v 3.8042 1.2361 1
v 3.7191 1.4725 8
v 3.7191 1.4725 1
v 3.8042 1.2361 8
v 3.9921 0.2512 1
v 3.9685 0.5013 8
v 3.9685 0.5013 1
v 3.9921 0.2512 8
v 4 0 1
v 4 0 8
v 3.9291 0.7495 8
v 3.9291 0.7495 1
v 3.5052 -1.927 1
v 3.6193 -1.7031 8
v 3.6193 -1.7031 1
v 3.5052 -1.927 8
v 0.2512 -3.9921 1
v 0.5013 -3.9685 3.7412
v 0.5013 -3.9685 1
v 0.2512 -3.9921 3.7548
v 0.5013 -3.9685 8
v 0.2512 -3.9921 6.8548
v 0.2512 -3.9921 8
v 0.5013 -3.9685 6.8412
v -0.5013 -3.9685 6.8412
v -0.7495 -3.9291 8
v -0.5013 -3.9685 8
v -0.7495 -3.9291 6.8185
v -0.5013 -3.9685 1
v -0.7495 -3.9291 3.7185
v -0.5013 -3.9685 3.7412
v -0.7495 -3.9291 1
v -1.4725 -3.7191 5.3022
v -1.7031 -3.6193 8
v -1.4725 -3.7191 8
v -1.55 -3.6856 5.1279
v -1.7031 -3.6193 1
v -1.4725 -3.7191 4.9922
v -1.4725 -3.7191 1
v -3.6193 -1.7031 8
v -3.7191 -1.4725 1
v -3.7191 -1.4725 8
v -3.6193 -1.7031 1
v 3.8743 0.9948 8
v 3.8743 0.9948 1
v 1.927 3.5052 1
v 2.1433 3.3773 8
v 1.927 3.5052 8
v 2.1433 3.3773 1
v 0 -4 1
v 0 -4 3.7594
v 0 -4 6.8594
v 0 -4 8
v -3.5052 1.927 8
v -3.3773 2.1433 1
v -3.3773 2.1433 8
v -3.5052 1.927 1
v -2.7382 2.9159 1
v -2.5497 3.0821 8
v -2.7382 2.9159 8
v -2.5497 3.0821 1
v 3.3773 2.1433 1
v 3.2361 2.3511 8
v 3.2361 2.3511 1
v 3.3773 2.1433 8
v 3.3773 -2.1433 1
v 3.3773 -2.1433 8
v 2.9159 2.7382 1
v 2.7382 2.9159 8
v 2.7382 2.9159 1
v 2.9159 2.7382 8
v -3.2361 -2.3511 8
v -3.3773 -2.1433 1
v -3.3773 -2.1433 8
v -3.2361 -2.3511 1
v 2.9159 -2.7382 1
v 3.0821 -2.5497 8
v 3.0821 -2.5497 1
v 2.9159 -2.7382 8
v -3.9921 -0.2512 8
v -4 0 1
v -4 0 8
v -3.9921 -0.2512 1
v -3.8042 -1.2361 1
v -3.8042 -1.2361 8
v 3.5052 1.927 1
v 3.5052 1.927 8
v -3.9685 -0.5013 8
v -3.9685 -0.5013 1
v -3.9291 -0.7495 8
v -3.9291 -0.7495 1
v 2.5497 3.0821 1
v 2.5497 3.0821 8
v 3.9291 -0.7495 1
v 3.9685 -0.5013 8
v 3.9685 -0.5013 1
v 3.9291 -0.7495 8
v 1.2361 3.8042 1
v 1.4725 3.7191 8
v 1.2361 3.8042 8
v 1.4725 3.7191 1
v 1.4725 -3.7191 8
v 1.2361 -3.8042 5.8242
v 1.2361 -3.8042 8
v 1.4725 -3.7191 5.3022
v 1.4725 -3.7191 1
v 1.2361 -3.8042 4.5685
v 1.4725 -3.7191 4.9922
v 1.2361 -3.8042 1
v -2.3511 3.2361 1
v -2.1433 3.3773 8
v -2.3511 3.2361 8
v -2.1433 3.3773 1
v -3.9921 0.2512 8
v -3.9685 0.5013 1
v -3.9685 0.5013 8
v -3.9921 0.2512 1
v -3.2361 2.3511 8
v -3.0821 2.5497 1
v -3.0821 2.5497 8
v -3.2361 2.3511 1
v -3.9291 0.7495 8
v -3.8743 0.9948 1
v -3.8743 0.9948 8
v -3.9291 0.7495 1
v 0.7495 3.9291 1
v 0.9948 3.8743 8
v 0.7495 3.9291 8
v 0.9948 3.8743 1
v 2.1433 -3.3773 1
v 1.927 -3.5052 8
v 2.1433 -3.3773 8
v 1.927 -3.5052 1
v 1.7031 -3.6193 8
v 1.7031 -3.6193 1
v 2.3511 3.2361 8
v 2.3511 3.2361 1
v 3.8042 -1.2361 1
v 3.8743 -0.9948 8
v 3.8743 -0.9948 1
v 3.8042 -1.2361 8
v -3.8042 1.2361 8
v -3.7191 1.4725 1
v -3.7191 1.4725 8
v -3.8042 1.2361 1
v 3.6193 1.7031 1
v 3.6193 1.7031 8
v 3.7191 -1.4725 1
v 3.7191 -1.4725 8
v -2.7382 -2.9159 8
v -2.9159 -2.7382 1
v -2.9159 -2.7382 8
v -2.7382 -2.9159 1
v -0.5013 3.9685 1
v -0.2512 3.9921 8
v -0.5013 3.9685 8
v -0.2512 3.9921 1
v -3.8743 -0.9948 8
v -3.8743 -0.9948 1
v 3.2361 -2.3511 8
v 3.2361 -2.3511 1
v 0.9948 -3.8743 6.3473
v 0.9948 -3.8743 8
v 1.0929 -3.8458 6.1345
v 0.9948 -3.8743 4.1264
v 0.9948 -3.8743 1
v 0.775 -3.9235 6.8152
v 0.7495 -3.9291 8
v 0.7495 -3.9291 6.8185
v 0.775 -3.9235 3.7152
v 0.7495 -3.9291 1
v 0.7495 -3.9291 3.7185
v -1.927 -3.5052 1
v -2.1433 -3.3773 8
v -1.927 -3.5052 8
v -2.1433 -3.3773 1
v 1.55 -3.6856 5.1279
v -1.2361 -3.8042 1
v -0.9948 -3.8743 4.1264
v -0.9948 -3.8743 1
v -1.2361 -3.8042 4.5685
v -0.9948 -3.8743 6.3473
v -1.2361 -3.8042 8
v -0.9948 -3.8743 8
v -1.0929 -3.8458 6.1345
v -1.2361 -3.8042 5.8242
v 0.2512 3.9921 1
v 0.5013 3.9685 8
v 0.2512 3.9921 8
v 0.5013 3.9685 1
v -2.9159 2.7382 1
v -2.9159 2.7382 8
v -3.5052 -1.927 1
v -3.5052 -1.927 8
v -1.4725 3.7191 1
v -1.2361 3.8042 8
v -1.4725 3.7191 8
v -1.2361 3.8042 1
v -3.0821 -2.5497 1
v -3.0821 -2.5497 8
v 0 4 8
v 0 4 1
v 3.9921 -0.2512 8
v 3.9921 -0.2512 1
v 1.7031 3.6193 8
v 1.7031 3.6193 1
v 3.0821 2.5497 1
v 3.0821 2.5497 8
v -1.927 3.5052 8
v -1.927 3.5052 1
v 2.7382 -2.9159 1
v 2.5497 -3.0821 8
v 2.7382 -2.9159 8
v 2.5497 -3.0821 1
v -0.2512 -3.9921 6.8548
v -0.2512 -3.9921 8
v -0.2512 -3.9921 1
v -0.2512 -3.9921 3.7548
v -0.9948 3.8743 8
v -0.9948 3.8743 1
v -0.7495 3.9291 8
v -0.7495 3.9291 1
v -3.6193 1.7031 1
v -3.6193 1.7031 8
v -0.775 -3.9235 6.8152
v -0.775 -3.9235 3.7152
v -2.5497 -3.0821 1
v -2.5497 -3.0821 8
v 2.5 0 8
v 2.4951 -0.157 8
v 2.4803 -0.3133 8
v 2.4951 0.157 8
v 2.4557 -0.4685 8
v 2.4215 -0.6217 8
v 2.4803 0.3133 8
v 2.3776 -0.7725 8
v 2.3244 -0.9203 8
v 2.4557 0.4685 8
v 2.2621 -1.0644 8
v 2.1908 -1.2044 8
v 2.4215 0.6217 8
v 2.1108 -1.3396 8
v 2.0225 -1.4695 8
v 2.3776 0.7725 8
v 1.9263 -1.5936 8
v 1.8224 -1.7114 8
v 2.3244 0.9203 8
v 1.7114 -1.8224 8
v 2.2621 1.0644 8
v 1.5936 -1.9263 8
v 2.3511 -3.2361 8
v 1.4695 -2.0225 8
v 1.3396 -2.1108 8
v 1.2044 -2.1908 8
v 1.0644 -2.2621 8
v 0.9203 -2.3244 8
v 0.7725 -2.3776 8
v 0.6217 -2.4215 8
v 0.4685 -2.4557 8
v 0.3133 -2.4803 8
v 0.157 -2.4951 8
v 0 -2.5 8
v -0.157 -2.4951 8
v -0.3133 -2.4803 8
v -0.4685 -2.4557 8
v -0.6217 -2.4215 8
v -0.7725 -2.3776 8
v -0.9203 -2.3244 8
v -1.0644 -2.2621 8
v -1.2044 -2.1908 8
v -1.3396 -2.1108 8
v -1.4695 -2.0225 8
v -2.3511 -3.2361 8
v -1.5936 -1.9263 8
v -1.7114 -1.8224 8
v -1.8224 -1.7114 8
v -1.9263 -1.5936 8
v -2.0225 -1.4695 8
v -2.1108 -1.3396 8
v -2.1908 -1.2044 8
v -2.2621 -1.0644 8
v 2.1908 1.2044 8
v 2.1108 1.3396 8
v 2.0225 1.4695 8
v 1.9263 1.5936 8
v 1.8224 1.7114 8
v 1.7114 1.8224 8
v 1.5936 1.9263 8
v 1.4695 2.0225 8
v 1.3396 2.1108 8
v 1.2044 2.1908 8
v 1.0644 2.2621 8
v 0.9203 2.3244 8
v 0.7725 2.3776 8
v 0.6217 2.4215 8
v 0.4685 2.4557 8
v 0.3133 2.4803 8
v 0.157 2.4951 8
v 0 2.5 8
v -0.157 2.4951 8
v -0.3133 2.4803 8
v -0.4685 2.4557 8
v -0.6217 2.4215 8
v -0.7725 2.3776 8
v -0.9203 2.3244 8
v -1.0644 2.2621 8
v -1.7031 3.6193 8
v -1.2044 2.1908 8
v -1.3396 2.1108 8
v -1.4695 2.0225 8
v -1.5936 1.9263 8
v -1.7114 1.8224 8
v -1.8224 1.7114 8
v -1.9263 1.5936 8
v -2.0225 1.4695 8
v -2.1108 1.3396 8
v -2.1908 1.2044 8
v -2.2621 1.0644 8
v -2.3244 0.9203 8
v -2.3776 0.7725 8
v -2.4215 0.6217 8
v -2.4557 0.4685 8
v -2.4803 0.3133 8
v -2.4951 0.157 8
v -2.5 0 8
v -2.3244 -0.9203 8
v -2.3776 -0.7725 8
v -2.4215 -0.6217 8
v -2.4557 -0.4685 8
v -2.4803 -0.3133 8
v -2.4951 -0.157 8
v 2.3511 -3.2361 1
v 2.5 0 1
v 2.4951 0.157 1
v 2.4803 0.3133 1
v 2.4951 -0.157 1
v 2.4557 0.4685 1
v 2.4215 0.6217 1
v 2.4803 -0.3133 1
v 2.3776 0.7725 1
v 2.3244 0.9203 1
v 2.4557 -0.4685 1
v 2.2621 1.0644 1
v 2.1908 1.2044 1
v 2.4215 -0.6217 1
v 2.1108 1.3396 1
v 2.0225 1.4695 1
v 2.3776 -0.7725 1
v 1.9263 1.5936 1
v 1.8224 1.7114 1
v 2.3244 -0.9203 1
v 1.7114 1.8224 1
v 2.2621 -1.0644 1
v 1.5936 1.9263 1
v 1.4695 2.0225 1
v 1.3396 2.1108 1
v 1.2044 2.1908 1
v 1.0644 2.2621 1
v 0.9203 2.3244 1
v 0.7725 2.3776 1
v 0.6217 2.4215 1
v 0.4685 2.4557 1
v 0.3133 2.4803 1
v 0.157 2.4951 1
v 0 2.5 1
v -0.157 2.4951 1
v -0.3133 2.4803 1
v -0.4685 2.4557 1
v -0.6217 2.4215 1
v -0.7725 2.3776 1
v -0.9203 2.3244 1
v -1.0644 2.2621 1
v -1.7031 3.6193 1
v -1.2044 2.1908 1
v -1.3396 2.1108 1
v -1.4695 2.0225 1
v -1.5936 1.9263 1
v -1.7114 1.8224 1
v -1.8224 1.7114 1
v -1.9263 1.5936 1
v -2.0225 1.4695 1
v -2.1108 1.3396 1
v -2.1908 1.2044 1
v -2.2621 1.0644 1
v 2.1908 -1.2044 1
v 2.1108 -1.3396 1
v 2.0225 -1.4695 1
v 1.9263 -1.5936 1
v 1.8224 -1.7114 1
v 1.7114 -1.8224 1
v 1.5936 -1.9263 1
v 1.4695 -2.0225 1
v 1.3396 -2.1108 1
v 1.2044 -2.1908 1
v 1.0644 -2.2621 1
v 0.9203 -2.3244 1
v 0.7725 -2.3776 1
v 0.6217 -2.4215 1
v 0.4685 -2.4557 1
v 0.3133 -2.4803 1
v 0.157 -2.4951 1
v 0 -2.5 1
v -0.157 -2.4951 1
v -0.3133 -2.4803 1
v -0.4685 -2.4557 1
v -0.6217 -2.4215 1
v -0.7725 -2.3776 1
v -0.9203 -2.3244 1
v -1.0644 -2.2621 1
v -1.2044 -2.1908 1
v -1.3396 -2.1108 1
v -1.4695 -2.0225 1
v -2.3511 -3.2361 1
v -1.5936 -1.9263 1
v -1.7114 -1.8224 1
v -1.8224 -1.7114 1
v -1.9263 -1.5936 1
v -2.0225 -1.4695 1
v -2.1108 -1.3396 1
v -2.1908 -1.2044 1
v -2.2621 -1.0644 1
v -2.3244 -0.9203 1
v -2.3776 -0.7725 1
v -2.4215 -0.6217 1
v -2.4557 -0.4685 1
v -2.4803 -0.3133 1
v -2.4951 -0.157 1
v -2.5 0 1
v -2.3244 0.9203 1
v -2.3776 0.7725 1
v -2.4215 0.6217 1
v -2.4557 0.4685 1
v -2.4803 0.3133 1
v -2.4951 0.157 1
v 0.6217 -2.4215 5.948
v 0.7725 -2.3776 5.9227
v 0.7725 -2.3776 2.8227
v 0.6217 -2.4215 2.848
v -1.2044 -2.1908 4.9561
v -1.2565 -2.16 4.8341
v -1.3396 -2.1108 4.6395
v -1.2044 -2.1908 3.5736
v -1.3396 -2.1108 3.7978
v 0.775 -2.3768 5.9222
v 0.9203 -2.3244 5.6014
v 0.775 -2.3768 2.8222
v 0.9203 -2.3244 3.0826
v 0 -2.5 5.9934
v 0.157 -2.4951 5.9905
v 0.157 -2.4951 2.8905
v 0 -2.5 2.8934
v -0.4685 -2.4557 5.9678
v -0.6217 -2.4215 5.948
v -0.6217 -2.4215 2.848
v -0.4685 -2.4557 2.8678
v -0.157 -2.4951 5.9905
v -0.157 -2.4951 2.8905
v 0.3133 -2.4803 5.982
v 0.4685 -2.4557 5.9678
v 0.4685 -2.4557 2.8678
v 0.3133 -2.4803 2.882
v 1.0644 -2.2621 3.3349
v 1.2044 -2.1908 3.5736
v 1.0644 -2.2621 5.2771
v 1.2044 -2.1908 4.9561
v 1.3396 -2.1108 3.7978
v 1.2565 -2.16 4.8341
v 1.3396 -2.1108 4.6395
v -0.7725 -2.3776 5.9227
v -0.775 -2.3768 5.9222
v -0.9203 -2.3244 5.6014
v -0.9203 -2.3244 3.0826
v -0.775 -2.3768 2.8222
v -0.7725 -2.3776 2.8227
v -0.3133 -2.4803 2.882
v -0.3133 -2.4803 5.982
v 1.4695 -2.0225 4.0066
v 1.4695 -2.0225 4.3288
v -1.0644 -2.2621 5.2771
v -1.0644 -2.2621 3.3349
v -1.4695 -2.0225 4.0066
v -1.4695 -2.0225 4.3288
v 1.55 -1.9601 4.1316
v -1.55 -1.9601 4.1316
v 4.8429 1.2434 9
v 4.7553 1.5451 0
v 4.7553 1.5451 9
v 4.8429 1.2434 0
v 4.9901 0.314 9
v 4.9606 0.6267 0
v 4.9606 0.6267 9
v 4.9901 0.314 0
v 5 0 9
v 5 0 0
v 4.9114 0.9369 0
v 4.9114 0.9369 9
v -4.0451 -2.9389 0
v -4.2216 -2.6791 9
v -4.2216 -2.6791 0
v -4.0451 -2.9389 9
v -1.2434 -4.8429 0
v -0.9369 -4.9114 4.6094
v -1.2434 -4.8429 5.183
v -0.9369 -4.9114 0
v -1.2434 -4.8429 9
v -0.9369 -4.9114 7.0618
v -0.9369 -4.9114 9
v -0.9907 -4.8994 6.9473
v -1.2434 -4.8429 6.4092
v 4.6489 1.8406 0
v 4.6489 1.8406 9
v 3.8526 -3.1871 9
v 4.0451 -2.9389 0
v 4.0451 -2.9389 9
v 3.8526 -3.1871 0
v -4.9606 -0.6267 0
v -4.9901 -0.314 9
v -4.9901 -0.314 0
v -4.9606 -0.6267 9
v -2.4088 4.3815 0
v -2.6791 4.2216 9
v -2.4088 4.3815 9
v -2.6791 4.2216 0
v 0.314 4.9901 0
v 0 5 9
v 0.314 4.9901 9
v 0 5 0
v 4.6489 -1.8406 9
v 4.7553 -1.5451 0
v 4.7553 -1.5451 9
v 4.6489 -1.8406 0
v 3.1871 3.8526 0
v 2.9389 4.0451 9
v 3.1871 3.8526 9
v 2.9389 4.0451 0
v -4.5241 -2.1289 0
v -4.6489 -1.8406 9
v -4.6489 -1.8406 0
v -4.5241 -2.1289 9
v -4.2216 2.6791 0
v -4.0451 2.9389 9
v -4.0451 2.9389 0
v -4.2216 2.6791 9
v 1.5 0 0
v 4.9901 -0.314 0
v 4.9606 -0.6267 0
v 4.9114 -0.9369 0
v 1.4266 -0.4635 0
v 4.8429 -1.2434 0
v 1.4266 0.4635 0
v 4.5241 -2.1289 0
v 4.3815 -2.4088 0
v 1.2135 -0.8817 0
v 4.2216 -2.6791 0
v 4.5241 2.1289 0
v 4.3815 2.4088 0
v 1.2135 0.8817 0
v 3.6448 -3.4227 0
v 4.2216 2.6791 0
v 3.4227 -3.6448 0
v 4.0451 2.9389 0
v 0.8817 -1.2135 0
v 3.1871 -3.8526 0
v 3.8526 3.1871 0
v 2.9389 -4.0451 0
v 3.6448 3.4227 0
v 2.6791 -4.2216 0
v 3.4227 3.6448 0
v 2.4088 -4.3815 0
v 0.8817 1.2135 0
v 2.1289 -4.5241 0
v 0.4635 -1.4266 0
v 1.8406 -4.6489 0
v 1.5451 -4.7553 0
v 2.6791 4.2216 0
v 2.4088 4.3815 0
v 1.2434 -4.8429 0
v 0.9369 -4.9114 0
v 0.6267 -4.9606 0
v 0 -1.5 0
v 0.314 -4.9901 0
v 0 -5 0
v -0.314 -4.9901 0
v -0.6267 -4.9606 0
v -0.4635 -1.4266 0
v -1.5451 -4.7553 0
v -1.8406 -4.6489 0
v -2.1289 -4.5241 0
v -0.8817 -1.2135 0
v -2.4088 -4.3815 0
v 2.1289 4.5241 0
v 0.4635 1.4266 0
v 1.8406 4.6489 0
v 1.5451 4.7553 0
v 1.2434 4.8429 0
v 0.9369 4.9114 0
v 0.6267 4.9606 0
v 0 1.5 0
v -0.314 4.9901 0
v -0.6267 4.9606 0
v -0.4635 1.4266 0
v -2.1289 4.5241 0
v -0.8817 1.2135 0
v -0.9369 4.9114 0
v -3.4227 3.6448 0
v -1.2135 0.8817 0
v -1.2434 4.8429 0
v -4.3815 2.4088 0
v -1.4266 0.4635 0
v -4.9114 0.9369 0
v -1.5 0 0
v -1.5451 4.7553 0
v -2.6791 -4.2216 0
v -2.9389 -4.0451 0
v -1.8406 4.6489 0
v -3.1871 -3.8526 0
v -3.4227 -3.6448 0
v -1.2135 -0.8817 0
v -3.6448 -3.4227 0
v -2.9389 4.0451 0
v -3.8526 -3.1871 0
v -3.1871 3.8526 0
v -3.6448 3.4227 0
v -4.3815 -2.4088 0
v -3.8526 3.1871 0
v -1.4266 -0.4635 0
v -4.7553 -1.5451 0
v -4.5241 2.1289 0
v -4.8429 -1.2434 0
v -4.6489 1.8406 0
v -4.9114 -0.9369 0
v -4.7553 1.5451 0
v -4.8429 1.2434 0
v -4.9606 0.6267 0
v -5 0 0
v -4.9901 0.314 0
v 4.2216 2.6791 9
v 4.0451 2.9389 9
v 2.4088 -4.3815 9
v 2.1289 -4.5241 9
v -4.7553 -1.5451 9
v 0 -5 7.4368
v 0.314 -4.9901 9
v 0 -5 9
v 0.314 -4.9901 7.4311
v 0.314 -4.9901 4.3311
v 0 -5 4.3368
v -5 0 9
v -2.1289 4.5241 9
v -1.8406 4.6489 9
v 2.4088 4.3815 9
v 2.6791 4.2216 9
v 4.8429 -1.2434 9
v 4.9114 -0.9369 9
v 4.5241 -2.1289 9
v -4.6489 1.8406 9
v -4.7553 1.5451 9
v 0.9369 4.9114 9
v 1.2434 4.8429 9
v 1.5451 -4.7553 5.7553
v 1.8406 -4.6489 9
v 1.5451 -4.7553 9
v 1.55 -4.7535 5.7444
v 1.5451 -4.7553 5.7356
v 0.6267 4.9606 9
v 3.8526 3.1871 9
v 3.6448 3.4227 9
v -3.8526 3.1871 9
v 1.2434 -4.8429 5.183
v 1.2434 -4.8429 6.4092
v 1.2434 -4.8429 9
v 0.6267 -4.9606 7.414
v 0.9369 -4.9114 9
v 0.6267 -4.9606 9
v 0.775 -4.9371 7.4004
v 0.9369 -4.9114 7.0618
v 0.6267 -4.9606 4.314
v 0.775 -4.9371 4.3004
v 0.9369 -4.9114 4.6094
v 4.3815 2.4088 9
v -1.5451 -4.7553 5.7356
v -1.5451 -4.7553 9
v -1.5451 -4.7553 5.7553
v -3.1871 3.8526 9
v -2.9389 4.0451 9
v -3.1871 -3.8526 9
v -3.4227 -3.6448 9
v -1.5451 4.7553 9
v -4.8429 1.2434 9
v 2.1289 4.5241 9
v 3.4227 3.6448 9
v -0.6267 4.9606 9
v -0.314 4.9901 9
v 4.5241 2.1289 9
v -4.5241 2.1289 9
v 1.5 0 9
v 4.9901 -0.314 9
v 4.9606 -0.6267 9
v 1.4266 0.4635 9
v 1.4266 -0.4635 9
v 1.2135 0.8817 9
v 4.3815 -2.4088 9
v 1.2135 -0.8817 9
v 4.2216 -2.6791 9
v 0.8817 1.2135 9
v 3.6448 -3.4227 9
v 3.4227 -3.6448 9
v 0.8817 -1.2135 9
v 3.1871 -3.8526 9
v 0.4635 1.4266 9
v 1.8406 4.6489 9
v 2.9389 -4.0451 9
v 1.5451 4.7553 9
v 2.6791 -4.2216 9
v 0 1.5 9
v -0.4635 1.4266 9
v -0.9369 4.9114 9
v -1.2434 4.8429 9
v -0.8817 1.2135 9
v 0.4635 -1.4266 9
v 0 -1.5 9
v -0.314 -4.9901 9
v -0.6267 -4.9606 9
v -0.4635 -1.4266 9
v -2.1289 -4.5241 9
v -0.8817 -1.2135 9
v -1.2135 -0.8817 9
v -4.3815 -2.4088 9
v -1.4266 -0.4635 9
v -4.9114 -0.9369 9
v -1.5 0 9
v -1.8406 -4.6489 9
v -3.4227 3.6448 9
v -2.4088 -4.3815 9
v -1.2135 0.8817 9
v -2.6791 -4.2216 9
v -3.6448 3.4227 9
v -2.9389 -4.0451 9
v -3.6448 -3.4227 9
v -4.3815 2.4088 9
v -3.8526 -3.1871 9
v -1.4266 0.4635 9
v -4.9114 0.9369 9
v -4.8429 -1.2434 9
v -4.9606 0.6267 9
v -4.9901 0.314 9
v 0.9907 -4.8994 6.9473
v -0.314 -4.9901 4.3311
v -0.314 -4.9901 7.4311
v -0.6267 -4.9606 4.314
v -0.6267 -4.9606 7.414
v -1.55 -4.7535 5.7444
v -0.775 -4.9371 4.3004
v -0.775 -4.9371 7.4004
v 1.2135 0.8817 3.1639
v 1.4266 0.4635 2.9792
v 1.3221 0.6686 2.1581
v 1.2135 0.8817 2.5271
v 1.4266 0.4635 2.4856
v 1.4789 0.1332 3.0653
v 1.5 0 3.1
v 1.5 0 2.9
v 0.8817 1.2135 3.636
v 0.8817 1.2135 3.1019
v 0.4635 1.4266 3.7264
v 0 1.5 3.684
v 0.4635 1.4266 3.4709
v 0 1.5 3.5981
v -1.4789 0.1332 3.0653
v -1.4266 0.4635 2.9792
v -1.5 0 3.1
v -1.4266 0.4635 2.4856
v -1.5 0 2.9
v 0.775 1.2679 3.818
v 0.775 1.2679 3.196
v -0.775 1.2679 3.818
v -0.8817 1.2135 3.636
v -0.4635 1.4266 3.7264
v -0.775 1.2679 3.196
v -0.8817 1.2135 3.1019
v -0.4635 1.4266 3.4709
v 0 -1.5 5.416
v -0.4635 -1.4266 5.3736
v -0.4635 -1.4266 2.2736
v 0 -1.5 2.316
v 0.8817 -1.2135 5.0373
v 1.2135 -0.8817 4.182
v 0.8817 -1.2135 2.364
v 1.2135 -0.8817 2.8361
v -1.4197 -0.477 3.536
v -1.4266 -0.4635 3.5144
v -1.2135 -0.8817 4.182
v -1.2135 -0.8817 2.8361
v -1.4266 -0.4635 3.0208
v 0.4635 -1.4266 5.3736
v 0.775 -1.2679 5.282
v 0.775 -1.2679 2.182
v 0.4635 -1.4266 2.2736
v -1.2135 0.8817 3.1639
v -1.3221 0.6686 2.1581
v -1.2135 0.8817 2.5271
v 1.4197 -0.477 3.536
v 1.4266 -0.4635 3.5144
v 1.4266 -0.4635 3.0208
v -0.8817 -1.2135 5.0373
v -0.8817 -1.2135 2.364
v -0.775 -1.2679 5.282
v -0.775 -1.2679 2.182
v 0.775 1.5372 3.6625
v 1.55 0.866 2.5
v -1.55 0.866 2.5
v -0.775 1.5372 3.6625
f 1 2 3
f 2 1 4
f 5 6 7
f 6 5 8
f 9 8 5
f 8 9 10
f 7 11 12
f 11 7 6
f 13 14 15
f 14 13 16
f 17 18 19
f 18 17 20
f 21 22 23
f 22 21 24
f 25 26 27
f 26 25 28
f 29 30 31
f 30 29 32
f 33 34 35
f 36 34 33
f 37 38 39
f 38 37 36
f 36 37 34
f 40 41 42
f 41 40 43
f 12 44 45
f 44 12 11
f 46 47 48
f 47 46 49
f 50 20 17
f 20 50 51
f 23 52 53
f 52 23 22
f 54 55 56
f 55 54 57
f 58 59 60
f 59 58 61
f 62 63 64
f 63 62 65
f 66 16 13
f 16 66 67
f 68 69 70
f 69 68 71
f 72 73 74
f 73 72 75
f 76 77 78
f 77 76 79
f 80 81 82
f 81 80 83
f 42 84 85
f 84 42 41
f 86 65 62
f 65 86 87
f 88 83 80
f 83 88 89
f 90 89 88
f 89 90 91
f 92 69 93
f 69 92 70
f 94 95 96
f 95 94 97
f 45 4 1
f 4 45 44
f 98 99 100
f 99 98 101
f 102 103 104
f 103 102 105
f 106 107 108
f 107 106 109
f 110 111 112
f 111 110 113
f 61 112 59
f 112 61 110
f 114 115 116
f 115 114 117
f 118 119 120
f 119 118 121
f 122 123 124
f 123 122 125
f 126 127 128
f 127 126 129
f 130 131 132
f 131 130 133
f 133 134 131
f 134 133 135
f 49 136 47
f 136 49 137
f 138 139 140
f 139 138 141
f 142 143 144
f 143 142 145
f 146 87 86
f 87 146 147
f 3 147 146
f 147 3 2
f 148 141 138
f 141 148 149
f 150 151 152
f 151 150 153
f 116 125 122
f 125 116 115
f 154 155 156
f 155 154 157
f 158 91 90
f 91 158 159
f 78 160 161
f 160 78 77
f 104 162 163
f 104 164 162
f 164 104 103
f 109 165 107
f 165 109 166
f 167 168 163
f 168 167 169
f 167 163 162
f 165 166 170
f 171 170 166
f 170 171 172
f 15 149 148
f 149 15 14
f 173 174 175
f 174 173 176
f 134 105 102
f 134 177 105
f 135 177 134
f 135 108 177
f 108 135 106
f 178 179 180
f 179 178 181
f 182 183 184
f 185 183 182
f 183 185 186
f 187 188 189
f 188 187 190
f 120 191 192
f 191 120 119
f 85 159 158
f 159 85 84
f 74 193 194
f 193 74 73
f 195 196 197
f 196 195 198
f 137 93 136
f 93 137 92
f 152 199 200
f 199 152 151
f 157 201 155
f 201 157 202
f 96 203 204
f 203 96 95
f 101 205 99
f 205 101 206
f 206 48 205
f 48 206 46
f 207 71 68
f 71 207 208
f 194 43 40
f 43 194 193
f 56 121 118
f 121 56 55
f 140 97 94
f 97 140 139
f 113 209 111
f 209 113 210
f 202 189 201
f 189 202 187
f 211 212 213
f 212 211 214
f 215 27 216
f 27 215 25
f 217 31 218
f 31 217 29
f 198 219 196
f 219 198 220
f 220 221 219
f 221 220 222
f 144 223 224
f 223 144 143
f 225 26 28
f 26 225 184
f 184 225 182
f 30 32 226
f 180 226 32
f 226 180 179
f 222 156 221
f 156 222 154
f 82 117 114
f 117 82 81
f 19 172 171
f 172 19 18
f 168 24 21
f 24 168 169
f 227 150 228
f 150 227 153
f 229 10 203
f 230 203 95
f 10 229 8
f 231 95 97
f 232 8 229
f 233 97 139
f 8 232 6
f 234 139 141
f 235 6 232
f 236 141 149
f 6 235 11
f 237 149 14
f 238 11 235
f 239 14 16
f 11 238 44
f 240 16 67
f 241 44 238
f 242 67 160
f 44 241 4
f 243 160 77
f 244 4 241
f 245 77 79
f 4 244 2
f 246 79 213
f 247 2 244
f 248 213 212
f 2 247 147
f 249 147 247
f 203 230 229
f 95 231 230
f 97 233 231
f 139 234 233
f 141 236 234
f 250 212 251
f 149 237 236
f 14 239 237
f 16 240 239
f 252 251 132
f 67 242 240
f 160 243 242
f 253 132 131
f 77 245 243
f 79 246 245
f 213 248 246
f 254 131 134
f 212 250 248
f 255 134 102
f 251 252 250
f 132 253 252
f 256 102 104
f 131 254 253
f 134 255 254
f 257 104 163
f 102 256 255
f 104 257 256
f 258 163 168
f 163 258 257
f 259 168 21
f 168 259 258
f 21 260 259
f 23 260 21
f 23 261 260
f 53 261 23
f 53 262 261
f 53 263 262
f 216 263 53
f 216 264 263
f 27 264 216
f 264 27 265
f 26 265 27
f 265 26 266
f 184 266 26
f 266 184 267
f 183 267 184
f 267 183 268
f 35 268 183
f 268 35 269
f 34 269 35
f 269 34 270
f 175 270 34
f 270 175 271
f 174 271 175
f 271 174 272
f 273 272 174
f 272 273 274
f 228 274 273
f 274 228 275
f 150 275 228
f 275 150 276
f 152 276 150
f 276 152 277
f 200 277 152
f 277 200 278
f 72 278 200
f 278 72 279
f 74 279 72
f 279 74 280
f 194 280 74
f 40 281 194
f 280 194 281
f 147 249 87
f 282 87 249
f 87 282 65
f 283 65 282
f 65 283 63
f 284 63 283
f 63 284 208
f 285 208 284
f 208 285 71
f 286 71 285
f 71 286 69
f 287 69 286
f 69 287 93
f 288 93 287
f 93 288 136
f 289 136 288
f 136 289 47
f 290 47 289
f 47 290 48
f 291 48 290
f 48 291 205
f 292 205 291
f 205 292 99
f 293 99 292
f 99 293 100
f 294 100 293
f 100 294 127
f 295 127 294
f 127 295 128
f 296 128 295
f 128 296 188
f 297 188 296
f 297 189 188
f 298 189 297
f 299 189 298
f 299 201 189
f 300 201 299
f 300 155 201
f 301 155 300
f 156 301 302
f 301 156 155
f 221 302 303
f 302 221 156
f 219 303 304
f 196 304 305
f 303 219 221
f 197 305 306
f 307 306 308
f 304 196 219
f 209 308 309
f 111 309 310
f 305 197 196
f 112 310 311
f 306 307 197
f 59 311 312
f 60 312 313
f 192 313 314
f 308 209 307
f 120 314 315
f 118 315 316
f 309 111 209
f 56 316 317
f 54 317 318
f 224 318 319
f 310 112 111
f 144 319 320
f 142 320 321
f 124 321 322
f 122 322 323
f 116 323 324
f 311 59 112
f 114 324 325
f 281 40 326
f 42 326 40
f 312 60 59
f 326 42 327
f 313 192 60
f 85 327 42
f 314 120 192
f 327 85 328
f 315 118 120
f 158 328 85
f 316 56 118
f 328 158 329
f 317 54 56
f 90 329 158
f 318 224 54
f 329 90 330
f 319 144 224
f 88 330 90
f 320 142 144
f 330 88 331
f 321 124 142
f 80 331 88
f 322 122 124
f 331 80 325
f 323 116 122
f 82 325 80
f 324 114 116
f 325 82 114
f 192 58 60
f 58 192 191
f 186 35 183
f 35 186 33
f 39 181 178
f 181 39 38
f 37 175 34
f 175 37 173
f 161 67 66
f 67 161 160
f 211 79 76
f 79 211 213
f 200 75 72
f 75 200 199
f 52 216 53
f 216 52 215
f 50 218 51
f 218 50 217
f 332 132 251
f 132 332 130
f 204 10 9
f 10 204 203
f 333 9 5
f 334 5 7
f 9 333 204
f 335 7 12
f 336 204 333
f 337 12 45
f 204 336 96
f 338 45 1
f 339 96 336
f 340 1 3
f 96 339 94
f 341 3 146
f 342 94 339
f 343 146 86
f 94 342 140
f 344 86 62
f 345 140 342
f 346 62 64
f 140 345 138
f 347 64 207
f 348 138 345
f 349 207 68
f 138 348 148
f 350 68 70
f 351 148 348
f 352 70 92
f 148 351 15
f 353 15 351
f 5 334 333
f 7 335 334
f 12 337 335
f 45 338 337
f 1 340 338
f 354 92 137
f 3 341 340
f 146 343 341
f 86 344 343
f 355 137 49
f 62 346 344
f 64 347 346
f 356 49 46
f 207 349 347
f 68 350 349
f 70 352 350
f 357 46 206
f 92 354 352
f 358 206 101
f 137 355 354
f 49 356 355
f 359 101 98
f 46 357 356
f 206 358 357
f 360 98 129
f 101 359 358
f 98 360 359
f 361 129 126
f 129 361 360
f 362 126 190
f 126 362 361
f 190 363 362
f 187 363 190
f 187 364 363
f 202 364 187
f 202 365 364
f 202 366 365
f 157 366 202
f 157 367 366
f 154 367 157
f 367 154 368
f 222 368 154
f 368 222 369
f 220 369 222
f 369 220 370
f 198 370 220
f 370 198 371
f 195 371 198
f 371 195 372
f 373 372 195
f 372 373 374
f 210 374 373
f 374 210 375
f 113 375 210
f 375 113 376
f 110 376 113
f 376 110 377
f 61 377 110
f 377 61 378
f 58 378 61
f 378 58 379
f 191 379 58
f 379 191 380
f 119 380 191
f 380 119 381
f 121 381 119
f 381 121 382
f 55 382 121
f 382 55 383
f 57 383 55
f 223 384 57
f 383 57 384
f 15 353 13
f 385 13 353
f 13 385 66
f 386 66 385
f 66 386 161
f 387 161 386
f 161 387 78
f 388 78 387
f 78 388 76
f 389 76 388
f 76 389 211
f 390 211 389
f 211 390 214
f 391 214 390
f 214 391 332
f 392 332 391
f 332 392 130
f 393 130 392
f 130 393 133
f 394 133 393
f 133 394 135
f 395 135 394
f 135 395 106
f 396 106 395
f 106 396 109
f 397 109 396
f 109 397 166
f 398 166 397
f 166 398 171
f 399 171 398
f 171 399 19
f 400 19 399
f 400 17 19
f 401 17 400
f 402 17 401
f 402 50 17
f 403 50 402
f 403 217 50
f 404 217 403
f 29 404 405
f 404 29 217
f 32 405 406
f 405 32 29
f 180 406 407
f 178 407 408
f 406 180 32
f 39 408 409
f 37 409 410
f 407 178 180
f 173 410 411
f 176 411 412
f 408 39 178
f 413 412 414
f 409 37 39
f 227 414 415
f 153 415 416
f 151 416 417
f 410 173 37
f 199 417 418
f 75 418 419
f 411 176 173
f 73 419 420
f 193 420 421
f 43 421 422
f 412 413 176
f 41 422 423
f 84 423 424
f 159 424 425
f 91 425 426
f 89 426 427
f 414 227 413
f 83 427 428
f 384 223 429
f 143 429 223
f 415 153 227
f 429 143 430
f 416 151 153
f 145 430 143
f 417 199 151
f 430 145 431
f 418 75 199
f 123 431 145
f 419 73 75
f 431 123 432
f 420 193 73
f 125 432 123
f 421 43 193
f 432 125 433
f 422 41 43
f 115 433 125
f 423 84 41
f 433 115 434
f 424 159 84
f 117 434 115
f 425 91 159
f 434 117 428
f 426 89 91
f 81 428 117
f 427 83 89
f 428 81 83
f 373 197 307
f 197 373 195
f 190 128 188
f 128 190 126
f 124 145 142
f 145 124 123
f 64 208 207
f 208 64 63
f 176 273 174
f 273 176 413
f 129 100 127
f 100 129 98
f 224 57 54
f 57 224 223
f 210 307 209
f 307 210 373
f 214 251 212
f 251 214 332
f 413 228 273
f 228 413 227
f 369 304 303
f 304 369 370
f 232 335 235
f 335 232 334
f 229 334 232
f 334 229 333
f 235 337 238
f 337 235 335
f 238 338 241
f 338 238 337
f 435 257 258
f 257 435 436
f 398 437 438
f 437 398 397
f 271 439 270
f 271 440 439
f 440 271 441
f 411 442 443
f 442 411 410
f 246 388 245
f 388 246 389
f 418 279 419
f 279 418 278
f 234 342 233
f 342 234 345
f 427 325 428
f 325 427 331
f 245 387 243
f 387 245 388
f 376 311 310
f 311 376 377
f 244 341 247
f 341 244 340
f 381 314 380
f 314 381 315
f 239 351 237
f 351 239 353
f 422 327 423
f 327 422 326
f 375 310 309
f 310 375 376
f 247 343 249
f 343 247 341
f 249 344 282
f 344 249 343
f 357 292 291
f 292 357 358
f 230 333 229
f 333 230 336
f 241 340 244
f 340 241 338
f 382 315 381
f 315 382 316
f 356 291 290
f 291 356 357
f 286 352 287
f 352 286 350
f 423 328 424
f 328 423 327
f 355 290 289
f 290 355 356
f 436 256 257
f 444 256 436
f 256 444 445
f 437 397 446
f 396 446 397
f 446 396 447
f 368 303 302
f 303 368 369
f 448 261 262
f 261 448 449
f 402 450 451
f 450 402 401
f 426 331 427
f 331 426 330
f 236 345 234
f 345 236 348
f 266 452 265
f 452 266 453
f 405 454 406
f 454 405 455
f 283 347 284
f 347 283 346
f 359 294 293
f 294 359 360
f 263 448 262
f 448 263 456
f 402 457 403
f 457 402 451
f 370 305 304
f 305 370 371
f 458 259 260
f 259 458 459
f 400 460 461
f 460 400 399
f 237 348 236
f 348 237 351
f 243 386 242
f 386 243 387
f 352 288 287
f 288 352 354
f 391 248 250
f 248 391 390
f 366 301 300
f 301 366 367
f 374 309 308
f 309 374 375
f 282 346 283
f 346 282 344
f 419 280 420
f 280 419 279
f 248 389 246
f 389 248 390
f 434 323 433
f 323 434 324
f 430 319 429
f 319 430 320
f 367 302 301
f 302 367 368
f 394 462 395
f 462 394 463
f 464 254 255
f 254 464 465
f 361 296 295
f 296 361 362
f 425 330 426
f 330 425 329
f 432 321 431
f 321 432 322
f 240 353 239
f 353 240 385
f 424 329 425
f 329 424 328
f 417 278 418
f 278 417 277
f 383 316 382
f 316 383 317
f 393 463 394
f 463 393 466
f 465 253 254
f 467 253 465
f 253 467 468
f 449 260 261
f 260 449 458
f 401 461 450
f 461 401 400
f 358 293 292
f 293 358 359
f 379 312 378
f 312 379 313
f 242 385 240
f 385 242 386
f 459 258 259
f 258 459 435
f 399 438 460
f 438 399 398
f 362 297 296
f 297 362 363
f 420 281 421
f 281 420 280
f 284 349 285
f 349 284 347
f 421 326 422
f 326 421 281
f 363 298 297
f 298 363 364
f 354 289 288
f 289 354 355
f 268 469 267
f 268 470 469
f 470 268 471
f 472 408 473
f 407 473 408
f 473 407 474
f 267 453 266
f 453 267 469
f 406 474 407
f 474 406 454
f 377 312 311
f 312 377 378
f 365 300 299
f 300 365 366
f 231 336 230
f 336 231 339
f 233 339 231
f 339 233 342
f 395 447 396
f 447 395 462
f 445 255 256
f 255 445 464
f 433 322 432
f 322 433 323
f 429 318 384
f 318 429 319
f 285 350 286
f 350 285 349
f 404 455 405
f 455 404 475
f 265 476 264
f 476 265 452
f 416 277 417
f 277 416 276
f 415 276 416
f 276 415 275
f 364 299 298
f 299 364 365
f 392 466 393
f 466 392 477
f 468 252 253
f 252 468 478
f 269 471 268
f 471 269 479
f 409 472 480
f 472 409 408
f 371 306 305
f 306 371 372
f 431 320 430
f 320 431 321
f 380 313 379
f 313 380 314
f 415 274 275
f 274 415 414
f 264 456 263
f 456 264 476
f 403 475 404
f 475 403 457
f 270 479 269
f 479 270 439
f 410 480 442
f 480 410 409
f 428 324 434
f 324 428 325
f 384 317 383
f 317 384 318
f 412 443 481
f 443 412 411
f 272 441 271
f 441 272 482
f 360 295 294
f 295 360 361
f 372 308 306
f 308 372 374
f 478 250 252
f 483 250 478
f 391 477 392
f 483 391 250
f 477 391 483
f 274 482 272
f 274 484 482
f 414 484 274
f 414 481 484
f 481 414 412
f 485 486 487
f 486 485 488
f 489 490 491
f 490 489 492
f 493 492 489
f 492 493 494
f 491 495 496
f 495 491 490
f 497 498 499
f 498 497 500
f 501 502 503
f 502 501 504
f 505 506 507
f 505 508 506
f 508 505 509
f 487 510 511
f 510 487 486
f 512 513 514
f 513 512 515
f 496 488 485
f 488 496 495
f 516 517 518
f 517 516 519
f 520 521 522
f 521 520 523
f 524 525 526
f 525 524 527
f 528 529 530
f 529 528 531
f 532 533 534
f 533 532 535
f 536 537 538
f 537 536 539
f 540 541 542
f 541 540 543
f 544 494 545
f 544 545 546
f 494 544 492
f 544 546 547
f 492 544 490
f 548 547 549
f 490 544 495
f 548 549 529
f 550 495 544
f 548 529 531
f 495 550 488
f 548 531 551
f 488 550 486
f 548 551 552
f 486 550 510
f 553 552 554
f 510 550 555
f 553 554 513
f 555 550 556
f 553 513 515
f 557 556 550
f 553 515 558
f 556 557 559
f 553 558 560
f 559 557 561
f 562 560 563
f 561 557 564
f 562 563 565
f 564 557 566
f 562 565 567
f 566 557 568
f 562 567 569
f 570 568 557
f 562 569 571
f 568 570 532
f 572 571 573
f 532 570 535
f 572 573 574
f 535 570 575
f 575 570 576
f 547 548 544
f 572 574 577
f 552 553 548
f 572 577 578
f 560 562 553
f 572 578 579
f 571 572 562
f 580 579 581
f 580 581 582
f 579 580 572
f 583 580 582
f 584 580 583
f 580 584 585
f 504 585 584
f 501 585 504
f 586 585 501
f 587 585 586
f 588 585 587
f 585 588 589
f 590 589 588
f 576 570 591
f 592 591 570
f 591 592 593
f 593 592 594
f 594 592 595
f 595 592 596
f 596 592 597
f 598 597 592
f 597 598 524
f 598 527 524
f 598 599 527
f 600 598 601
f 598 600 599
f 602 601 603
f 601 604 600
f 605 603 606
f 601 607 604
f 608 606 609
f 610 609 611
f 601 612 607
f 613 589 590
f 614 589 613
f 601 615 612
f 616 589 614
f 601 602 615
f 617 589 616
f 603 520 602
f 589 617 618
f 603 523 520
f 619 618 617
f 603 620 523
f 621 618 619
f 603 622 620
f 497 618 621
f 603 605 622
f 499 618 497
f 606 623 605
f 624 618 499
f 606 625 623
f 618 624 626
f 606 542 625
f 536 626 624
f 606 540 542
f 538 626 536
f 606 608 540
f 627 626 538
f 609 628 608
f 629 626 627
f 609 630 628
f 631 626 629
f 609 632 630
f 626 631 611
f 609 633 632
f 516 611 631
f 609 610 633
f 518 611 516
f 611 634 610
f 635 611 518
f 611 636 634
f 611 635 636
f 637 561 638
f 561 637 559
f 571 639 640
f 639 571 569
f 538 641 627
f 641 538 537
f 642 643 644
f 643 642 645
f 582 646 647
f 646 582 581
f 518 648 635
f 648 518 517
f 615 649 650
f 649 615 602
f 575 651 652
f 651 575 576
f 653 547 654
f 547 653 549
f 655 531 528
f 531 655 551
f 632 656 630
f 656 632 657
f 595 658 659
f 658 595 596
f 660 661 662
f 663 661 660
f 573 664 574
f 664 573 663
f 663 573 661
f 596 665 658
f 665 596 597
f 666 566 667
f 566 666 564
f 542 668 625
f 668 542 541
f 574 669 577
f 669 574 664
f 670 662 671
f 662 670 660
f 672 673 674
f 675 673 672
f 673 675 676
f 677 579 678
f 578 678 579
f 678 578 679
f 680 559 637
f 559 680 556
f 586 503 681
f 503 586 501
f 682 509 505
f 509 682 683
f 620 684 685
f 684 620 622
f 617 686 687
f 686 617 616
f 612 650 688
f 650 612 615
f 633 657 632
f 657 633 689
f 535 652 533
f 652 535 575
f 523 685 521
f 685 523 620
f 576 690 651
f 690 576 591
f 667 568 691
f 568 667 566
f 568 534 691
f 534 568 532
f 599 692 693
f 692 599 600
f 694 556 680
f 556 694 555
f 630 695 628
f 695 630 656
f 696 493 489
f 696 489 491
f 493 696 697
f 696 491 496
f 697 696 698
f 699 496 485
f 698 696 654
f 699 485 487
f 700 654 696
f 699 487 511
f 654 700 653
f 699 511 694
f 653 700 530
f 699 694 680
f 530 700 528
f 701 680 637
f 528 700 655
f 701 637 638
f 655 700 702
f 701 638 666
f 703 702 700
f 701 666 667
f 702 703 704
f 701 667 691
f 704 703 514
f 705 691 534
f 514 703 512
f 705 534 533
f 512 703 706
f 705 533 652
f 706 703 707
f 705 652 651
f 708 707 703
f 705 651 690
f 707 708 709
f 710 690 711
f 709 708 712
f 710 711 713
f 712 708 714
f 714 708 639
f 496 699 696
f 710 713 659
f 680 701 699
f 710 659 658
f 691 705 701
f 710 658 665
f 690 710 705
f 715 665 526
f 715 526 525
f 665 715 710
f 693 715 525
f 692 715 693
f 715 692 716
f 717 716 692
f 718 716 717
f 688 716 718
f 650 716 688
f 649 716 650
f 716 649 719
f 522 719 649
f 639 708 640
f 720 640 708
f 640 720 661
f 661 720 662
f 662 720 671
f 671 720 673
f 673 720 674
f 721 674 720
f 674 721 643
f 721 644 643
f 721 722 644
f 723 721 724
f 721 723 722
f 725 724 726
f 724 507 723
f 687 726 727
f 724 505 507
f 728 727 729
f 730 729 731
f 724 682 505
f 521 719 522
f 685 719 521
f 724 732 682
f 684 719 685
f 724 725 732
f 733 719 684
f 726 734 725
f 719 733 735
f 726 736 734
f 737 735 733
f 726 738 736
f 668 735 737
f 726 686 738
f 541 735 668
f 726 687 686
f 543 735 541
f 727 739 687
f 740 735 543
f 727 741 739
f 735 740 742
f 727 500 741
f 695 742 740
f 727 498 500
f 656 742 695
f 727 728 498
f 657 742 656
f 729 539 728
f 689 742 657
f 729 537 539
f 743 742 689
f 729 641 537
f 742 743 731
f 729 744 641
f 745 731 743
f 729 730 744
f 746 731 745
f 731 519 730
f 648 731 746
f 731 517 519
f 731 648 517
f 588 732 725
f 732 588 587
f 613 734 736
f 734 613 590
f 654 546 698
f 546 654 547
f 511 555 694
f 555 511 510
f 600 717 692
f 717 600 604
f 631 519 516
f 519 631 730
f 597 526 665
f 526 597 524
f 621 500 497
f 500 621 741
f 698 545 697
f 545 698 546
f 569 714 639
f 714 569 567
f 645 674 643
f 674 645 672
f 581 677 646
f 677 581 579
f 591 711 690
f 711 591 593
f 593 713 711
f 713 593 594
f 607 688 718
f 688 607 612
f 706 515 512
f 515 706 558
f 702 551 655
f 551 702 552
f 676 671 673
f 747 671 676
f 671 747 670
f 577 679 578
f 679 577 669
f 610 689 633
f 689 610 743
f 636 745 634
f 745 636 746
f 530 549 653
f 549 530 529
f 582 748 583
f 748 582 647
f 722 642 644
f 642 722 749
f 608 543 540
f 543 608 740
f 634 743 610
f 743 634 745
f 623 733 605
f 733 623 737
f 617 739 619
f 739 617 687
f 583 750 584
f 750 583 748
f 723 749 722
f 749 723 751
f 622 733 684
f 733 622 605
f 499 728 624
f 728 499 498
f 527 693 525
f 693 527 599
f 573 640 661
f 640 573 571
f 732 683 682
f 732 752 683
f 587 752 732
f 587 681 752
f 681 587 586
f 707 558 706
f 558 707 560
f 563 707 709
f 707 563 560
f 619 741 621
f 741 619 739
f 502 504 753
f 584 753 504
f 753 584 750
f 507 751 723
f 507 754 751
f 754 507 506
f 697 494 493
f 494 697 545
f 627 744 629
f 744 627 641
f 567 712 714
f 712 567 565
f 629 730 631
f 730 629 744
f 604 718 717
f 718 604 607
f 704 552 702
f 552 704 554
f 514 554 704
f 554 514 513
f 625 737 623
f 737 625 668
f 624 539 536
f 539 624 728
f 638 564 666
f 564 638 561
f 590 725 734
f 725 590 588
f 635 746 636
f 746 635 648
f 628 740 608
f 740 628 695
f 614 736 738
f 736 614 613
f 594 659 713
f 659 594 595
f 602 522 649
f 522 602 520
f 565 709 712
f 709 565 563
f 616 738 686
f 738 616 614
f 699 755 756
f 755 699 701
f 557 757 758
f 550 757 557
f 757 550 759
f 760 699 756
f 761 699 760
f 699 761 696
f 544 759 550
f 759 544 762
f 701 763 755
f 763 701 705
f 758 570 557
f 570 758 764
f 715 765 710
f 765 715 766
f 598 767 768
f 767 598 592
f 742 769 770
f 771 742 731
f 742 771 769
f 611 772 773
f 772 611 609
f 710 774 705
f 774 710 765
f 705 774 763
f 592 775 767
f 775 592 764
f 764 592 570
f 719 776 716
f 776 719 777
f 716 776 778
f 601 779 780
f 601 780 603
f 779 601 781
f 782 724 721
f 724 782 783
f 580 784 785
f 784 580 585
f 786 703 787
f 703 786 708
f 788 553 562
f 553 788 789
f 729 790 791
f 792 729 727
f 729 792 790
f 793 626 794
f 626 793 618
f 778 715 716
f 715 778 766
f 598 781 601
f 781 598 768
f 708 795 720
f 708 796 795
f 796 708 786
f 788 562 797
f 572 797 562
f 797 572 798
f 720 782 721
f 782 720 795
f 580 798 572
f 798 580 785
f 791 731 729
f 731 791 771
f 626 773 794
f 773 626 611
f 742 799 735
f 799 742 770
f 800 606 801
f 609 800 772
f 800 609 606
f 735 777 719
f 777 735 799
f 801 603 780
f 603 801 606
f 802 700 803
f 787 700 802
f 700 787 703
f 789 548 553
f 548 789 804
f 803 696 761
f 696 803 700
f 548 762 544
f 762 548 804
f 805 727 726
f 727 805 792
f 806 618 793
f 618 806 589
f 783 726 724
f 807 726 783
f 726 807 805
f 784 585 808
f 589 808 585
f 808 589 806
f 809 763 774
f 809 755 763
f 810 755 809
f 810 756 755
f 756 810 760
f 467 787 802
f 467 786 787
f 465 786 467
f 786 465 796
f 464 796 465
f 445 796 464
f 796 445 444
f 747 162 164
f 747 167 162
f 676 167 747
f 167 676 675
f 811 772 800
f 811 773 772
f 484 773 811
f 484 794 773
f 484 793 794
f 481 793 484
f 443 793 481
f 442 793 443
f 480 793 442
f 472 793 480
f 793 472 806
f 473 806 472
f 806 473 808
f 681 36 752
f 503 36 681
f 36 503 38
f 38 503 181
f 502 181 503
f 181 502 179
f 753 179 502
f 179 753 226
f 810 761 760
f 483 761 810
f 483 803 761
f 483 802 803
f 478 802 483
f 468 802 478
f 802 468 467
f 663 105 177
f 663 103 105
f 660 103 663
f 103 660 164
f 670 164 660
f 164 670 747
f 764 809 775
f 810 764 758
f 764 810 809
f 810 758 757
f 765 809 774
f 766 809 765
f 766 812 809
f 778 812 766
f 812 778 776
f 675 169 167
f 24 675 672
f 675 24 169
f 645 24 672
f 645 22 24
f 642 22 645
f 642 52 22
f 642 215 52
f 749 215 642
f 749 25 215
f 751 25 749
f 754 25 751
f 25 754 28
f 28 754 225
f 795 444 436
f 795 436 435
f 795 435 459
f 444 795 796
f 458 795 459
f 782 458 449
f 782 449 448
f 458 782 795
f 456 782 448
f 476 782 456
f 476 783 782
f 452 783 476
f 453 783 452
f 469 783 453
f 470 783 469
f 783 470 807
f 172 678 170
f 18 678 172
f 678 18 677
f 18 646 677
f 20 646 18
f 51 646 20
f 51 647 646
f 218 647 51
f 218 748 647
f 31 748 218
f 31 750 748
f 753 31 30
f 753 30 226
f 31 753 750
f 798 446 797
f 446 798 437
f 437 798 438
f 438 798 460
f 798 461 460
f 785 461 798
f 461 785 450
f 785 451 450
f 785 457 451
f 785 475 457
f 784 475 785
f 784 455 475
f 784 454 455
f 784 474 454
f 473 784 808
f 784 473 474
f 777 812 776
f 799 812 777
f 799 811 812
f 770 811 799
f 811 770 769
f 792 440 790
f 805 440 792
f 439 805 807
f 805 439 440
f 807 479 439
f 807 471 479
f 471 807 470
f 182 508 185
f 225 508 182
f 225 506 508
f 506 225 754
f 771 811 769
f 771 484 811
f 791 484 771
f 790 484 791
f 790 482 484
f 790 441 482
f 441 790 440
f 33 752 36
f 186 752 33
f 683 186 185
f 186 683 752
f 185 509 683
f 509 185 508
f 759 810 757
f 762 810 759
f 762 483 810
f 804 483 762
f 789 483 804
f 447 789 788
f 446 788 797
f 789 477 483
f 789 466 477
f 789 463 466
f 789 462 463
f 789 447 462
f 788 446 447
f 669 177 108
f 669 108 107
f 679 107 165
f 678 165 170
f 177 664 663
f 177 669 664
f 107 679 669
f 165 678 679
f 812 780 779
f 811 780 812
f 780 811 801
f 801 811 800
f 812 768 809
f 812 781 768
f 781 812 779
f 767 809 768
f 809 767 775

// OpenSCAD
// левое колесо
//wheel_with_axis();
// правое колесо
//rotate([180, 0, 0]) mirror([0, 0, 1]) wheel_with_axis();
// зажим для оси, блокирующий колесо
axis_jam(3.1);
// прокладка между задним колесом и платформой
//wheel_shim();

/** 
 * Колесо с отверстием под ось.
 */
module wheel_with_axis() {
  difference() {
    wheel();
    generic_axis();
    // белый с круглой осью
    //motor1_axis();
    // желтый со срезанной осью
    //motor2_axis();
  }
}

/** 
 * Колесо.
 */
module wheel() {

  // внешний обод
  difference() {
    // лысая резина
    //cylinder(h=20, r=25, $fn=100);
    // рельефный протектор
    translate([0, 0, 10]) {
      linear_extrude(height=10, twist=10) 
          import(file = "протектор.dxf");
      mirror([0, 0, -1]) 
        linear_extrude(height=10, twist=10) 
          import(file = "протектор.dxf");
    }

    translate([0, 0, -1])
      cylinder(h=22, r=20, $fn=100);
  }

  // внутренний вал
  cylinder(h=10, r=5, $fn=100);

  // спицы
  for(angle = [0, 72, 144, 216, 288]) {
    rotate(a=angle) rundle();
  }
}

/**
 * Спица.
 */
module rundle() {
  // простая спица 
  //translate([0, -1.5, 0]) cube([22, 3, 10]);
  
  // спица покрасивше
  translate([0, -1.5, 0]) 
    // вычтем из параллелепипеда часть цилиндра, 
    // чтобы получилось скругленное ребро
    difference() {
      cube([22, 3, 20]);
      translate([0, -1, 36]) rotate([270,0,0])
        cylinder(h=5, r=27, $fn=100);
    }
}

/**
 * Зажим для оси с отверстием под стягивающий винт.
 */
module axis_jam(screw_diam=3) {
  difference() {
    // главный вал
    cylinder(h=9, r=5, $fn=100);

    // ось
    generic_axis();
    //motor1_axis();
    //motor2_axis();

    // отверстие под винт m3x6
    translate([0, 0, 3]) rotate([60, 0, 0])
      // винт должен прорезать не только
      // внешнюю стенку, но и внутреннюю 
      // поверхность трубы
      translate([0, 0, -1])
      cylinder(h=10, r=screw_diam/2, $fn=6);

    // полость внутри кольца, чтобы винт легче вкручивался
    translate([0, 0, 1]) difference() {
      cylinder(h=7, r=4, $fn=100);
      // для оси с r=1.5 мм
      cylinder(h=7, r=2.5, $fn=100);      
    }
  }
}

/**
 * Небольшая прокладка между задним колесом и платформой,
 * чтобы клесо при вращении не зацеплялось за платформу.
 */
module wheel_shim(height=3) {
  difference() {
    // внутренний вал
    cylinder(h=height, r=5, $fn=100);

    // ось
    generic_axis();
    //motor1_axis();
    //motor2_axis();
  }
}

/**
 * Просто круглая ось, по умолчанию диаметр 3мм.
 */
module generic_axis(length=22, radius=1.5) {
  translate([0,0,-1])
    cylinder(h=length, r=radius, $fn=20);
}

/** 
 * Ось для для мотора 1:
 * GM7 - Gear Motor 7 - Baby GM3 (прямой, белый)
 * www.robotshop.com/en/solarbotics-gm7-gear-motor-7.html
 *
 * Диаметр оси мотора 2мм, сделаем модель 1.5мм.
 */
module motor1_axis(length=22) {
  // 1.5мм диаметр
  generic_axis(length, 0.75);
}

/** 
 * Ось для для мотора 2:
 * Pololu 4.5V, 80rpm Right Angle (прямой, желтый)
 * www.robotshop.com/en/solarbotics-gm7-gear-motor-7.html
 *
 * Диаметр оси мотора 3мм, срез с одного бока cut=0.3мм.
 */
module motor2_axis(length=22, cut=0.3) {
  // диаметр 3мм, срез с одного бока 0.3мм
  translate([0,0,-1])
  difference() {
    cylinder(h=length, r=1.5, $fn=20);
    // 1.5 мм "вниз" по y (совместить куб с цилиндром), 
    // 1.1 "вправо" по x (срезать справа, для cut=0.3мм: 1.5-0.3=1.2)
    translate([1.5-cut, -1.5, 0]) 
      cube([2, 3, length]);
  }
}
